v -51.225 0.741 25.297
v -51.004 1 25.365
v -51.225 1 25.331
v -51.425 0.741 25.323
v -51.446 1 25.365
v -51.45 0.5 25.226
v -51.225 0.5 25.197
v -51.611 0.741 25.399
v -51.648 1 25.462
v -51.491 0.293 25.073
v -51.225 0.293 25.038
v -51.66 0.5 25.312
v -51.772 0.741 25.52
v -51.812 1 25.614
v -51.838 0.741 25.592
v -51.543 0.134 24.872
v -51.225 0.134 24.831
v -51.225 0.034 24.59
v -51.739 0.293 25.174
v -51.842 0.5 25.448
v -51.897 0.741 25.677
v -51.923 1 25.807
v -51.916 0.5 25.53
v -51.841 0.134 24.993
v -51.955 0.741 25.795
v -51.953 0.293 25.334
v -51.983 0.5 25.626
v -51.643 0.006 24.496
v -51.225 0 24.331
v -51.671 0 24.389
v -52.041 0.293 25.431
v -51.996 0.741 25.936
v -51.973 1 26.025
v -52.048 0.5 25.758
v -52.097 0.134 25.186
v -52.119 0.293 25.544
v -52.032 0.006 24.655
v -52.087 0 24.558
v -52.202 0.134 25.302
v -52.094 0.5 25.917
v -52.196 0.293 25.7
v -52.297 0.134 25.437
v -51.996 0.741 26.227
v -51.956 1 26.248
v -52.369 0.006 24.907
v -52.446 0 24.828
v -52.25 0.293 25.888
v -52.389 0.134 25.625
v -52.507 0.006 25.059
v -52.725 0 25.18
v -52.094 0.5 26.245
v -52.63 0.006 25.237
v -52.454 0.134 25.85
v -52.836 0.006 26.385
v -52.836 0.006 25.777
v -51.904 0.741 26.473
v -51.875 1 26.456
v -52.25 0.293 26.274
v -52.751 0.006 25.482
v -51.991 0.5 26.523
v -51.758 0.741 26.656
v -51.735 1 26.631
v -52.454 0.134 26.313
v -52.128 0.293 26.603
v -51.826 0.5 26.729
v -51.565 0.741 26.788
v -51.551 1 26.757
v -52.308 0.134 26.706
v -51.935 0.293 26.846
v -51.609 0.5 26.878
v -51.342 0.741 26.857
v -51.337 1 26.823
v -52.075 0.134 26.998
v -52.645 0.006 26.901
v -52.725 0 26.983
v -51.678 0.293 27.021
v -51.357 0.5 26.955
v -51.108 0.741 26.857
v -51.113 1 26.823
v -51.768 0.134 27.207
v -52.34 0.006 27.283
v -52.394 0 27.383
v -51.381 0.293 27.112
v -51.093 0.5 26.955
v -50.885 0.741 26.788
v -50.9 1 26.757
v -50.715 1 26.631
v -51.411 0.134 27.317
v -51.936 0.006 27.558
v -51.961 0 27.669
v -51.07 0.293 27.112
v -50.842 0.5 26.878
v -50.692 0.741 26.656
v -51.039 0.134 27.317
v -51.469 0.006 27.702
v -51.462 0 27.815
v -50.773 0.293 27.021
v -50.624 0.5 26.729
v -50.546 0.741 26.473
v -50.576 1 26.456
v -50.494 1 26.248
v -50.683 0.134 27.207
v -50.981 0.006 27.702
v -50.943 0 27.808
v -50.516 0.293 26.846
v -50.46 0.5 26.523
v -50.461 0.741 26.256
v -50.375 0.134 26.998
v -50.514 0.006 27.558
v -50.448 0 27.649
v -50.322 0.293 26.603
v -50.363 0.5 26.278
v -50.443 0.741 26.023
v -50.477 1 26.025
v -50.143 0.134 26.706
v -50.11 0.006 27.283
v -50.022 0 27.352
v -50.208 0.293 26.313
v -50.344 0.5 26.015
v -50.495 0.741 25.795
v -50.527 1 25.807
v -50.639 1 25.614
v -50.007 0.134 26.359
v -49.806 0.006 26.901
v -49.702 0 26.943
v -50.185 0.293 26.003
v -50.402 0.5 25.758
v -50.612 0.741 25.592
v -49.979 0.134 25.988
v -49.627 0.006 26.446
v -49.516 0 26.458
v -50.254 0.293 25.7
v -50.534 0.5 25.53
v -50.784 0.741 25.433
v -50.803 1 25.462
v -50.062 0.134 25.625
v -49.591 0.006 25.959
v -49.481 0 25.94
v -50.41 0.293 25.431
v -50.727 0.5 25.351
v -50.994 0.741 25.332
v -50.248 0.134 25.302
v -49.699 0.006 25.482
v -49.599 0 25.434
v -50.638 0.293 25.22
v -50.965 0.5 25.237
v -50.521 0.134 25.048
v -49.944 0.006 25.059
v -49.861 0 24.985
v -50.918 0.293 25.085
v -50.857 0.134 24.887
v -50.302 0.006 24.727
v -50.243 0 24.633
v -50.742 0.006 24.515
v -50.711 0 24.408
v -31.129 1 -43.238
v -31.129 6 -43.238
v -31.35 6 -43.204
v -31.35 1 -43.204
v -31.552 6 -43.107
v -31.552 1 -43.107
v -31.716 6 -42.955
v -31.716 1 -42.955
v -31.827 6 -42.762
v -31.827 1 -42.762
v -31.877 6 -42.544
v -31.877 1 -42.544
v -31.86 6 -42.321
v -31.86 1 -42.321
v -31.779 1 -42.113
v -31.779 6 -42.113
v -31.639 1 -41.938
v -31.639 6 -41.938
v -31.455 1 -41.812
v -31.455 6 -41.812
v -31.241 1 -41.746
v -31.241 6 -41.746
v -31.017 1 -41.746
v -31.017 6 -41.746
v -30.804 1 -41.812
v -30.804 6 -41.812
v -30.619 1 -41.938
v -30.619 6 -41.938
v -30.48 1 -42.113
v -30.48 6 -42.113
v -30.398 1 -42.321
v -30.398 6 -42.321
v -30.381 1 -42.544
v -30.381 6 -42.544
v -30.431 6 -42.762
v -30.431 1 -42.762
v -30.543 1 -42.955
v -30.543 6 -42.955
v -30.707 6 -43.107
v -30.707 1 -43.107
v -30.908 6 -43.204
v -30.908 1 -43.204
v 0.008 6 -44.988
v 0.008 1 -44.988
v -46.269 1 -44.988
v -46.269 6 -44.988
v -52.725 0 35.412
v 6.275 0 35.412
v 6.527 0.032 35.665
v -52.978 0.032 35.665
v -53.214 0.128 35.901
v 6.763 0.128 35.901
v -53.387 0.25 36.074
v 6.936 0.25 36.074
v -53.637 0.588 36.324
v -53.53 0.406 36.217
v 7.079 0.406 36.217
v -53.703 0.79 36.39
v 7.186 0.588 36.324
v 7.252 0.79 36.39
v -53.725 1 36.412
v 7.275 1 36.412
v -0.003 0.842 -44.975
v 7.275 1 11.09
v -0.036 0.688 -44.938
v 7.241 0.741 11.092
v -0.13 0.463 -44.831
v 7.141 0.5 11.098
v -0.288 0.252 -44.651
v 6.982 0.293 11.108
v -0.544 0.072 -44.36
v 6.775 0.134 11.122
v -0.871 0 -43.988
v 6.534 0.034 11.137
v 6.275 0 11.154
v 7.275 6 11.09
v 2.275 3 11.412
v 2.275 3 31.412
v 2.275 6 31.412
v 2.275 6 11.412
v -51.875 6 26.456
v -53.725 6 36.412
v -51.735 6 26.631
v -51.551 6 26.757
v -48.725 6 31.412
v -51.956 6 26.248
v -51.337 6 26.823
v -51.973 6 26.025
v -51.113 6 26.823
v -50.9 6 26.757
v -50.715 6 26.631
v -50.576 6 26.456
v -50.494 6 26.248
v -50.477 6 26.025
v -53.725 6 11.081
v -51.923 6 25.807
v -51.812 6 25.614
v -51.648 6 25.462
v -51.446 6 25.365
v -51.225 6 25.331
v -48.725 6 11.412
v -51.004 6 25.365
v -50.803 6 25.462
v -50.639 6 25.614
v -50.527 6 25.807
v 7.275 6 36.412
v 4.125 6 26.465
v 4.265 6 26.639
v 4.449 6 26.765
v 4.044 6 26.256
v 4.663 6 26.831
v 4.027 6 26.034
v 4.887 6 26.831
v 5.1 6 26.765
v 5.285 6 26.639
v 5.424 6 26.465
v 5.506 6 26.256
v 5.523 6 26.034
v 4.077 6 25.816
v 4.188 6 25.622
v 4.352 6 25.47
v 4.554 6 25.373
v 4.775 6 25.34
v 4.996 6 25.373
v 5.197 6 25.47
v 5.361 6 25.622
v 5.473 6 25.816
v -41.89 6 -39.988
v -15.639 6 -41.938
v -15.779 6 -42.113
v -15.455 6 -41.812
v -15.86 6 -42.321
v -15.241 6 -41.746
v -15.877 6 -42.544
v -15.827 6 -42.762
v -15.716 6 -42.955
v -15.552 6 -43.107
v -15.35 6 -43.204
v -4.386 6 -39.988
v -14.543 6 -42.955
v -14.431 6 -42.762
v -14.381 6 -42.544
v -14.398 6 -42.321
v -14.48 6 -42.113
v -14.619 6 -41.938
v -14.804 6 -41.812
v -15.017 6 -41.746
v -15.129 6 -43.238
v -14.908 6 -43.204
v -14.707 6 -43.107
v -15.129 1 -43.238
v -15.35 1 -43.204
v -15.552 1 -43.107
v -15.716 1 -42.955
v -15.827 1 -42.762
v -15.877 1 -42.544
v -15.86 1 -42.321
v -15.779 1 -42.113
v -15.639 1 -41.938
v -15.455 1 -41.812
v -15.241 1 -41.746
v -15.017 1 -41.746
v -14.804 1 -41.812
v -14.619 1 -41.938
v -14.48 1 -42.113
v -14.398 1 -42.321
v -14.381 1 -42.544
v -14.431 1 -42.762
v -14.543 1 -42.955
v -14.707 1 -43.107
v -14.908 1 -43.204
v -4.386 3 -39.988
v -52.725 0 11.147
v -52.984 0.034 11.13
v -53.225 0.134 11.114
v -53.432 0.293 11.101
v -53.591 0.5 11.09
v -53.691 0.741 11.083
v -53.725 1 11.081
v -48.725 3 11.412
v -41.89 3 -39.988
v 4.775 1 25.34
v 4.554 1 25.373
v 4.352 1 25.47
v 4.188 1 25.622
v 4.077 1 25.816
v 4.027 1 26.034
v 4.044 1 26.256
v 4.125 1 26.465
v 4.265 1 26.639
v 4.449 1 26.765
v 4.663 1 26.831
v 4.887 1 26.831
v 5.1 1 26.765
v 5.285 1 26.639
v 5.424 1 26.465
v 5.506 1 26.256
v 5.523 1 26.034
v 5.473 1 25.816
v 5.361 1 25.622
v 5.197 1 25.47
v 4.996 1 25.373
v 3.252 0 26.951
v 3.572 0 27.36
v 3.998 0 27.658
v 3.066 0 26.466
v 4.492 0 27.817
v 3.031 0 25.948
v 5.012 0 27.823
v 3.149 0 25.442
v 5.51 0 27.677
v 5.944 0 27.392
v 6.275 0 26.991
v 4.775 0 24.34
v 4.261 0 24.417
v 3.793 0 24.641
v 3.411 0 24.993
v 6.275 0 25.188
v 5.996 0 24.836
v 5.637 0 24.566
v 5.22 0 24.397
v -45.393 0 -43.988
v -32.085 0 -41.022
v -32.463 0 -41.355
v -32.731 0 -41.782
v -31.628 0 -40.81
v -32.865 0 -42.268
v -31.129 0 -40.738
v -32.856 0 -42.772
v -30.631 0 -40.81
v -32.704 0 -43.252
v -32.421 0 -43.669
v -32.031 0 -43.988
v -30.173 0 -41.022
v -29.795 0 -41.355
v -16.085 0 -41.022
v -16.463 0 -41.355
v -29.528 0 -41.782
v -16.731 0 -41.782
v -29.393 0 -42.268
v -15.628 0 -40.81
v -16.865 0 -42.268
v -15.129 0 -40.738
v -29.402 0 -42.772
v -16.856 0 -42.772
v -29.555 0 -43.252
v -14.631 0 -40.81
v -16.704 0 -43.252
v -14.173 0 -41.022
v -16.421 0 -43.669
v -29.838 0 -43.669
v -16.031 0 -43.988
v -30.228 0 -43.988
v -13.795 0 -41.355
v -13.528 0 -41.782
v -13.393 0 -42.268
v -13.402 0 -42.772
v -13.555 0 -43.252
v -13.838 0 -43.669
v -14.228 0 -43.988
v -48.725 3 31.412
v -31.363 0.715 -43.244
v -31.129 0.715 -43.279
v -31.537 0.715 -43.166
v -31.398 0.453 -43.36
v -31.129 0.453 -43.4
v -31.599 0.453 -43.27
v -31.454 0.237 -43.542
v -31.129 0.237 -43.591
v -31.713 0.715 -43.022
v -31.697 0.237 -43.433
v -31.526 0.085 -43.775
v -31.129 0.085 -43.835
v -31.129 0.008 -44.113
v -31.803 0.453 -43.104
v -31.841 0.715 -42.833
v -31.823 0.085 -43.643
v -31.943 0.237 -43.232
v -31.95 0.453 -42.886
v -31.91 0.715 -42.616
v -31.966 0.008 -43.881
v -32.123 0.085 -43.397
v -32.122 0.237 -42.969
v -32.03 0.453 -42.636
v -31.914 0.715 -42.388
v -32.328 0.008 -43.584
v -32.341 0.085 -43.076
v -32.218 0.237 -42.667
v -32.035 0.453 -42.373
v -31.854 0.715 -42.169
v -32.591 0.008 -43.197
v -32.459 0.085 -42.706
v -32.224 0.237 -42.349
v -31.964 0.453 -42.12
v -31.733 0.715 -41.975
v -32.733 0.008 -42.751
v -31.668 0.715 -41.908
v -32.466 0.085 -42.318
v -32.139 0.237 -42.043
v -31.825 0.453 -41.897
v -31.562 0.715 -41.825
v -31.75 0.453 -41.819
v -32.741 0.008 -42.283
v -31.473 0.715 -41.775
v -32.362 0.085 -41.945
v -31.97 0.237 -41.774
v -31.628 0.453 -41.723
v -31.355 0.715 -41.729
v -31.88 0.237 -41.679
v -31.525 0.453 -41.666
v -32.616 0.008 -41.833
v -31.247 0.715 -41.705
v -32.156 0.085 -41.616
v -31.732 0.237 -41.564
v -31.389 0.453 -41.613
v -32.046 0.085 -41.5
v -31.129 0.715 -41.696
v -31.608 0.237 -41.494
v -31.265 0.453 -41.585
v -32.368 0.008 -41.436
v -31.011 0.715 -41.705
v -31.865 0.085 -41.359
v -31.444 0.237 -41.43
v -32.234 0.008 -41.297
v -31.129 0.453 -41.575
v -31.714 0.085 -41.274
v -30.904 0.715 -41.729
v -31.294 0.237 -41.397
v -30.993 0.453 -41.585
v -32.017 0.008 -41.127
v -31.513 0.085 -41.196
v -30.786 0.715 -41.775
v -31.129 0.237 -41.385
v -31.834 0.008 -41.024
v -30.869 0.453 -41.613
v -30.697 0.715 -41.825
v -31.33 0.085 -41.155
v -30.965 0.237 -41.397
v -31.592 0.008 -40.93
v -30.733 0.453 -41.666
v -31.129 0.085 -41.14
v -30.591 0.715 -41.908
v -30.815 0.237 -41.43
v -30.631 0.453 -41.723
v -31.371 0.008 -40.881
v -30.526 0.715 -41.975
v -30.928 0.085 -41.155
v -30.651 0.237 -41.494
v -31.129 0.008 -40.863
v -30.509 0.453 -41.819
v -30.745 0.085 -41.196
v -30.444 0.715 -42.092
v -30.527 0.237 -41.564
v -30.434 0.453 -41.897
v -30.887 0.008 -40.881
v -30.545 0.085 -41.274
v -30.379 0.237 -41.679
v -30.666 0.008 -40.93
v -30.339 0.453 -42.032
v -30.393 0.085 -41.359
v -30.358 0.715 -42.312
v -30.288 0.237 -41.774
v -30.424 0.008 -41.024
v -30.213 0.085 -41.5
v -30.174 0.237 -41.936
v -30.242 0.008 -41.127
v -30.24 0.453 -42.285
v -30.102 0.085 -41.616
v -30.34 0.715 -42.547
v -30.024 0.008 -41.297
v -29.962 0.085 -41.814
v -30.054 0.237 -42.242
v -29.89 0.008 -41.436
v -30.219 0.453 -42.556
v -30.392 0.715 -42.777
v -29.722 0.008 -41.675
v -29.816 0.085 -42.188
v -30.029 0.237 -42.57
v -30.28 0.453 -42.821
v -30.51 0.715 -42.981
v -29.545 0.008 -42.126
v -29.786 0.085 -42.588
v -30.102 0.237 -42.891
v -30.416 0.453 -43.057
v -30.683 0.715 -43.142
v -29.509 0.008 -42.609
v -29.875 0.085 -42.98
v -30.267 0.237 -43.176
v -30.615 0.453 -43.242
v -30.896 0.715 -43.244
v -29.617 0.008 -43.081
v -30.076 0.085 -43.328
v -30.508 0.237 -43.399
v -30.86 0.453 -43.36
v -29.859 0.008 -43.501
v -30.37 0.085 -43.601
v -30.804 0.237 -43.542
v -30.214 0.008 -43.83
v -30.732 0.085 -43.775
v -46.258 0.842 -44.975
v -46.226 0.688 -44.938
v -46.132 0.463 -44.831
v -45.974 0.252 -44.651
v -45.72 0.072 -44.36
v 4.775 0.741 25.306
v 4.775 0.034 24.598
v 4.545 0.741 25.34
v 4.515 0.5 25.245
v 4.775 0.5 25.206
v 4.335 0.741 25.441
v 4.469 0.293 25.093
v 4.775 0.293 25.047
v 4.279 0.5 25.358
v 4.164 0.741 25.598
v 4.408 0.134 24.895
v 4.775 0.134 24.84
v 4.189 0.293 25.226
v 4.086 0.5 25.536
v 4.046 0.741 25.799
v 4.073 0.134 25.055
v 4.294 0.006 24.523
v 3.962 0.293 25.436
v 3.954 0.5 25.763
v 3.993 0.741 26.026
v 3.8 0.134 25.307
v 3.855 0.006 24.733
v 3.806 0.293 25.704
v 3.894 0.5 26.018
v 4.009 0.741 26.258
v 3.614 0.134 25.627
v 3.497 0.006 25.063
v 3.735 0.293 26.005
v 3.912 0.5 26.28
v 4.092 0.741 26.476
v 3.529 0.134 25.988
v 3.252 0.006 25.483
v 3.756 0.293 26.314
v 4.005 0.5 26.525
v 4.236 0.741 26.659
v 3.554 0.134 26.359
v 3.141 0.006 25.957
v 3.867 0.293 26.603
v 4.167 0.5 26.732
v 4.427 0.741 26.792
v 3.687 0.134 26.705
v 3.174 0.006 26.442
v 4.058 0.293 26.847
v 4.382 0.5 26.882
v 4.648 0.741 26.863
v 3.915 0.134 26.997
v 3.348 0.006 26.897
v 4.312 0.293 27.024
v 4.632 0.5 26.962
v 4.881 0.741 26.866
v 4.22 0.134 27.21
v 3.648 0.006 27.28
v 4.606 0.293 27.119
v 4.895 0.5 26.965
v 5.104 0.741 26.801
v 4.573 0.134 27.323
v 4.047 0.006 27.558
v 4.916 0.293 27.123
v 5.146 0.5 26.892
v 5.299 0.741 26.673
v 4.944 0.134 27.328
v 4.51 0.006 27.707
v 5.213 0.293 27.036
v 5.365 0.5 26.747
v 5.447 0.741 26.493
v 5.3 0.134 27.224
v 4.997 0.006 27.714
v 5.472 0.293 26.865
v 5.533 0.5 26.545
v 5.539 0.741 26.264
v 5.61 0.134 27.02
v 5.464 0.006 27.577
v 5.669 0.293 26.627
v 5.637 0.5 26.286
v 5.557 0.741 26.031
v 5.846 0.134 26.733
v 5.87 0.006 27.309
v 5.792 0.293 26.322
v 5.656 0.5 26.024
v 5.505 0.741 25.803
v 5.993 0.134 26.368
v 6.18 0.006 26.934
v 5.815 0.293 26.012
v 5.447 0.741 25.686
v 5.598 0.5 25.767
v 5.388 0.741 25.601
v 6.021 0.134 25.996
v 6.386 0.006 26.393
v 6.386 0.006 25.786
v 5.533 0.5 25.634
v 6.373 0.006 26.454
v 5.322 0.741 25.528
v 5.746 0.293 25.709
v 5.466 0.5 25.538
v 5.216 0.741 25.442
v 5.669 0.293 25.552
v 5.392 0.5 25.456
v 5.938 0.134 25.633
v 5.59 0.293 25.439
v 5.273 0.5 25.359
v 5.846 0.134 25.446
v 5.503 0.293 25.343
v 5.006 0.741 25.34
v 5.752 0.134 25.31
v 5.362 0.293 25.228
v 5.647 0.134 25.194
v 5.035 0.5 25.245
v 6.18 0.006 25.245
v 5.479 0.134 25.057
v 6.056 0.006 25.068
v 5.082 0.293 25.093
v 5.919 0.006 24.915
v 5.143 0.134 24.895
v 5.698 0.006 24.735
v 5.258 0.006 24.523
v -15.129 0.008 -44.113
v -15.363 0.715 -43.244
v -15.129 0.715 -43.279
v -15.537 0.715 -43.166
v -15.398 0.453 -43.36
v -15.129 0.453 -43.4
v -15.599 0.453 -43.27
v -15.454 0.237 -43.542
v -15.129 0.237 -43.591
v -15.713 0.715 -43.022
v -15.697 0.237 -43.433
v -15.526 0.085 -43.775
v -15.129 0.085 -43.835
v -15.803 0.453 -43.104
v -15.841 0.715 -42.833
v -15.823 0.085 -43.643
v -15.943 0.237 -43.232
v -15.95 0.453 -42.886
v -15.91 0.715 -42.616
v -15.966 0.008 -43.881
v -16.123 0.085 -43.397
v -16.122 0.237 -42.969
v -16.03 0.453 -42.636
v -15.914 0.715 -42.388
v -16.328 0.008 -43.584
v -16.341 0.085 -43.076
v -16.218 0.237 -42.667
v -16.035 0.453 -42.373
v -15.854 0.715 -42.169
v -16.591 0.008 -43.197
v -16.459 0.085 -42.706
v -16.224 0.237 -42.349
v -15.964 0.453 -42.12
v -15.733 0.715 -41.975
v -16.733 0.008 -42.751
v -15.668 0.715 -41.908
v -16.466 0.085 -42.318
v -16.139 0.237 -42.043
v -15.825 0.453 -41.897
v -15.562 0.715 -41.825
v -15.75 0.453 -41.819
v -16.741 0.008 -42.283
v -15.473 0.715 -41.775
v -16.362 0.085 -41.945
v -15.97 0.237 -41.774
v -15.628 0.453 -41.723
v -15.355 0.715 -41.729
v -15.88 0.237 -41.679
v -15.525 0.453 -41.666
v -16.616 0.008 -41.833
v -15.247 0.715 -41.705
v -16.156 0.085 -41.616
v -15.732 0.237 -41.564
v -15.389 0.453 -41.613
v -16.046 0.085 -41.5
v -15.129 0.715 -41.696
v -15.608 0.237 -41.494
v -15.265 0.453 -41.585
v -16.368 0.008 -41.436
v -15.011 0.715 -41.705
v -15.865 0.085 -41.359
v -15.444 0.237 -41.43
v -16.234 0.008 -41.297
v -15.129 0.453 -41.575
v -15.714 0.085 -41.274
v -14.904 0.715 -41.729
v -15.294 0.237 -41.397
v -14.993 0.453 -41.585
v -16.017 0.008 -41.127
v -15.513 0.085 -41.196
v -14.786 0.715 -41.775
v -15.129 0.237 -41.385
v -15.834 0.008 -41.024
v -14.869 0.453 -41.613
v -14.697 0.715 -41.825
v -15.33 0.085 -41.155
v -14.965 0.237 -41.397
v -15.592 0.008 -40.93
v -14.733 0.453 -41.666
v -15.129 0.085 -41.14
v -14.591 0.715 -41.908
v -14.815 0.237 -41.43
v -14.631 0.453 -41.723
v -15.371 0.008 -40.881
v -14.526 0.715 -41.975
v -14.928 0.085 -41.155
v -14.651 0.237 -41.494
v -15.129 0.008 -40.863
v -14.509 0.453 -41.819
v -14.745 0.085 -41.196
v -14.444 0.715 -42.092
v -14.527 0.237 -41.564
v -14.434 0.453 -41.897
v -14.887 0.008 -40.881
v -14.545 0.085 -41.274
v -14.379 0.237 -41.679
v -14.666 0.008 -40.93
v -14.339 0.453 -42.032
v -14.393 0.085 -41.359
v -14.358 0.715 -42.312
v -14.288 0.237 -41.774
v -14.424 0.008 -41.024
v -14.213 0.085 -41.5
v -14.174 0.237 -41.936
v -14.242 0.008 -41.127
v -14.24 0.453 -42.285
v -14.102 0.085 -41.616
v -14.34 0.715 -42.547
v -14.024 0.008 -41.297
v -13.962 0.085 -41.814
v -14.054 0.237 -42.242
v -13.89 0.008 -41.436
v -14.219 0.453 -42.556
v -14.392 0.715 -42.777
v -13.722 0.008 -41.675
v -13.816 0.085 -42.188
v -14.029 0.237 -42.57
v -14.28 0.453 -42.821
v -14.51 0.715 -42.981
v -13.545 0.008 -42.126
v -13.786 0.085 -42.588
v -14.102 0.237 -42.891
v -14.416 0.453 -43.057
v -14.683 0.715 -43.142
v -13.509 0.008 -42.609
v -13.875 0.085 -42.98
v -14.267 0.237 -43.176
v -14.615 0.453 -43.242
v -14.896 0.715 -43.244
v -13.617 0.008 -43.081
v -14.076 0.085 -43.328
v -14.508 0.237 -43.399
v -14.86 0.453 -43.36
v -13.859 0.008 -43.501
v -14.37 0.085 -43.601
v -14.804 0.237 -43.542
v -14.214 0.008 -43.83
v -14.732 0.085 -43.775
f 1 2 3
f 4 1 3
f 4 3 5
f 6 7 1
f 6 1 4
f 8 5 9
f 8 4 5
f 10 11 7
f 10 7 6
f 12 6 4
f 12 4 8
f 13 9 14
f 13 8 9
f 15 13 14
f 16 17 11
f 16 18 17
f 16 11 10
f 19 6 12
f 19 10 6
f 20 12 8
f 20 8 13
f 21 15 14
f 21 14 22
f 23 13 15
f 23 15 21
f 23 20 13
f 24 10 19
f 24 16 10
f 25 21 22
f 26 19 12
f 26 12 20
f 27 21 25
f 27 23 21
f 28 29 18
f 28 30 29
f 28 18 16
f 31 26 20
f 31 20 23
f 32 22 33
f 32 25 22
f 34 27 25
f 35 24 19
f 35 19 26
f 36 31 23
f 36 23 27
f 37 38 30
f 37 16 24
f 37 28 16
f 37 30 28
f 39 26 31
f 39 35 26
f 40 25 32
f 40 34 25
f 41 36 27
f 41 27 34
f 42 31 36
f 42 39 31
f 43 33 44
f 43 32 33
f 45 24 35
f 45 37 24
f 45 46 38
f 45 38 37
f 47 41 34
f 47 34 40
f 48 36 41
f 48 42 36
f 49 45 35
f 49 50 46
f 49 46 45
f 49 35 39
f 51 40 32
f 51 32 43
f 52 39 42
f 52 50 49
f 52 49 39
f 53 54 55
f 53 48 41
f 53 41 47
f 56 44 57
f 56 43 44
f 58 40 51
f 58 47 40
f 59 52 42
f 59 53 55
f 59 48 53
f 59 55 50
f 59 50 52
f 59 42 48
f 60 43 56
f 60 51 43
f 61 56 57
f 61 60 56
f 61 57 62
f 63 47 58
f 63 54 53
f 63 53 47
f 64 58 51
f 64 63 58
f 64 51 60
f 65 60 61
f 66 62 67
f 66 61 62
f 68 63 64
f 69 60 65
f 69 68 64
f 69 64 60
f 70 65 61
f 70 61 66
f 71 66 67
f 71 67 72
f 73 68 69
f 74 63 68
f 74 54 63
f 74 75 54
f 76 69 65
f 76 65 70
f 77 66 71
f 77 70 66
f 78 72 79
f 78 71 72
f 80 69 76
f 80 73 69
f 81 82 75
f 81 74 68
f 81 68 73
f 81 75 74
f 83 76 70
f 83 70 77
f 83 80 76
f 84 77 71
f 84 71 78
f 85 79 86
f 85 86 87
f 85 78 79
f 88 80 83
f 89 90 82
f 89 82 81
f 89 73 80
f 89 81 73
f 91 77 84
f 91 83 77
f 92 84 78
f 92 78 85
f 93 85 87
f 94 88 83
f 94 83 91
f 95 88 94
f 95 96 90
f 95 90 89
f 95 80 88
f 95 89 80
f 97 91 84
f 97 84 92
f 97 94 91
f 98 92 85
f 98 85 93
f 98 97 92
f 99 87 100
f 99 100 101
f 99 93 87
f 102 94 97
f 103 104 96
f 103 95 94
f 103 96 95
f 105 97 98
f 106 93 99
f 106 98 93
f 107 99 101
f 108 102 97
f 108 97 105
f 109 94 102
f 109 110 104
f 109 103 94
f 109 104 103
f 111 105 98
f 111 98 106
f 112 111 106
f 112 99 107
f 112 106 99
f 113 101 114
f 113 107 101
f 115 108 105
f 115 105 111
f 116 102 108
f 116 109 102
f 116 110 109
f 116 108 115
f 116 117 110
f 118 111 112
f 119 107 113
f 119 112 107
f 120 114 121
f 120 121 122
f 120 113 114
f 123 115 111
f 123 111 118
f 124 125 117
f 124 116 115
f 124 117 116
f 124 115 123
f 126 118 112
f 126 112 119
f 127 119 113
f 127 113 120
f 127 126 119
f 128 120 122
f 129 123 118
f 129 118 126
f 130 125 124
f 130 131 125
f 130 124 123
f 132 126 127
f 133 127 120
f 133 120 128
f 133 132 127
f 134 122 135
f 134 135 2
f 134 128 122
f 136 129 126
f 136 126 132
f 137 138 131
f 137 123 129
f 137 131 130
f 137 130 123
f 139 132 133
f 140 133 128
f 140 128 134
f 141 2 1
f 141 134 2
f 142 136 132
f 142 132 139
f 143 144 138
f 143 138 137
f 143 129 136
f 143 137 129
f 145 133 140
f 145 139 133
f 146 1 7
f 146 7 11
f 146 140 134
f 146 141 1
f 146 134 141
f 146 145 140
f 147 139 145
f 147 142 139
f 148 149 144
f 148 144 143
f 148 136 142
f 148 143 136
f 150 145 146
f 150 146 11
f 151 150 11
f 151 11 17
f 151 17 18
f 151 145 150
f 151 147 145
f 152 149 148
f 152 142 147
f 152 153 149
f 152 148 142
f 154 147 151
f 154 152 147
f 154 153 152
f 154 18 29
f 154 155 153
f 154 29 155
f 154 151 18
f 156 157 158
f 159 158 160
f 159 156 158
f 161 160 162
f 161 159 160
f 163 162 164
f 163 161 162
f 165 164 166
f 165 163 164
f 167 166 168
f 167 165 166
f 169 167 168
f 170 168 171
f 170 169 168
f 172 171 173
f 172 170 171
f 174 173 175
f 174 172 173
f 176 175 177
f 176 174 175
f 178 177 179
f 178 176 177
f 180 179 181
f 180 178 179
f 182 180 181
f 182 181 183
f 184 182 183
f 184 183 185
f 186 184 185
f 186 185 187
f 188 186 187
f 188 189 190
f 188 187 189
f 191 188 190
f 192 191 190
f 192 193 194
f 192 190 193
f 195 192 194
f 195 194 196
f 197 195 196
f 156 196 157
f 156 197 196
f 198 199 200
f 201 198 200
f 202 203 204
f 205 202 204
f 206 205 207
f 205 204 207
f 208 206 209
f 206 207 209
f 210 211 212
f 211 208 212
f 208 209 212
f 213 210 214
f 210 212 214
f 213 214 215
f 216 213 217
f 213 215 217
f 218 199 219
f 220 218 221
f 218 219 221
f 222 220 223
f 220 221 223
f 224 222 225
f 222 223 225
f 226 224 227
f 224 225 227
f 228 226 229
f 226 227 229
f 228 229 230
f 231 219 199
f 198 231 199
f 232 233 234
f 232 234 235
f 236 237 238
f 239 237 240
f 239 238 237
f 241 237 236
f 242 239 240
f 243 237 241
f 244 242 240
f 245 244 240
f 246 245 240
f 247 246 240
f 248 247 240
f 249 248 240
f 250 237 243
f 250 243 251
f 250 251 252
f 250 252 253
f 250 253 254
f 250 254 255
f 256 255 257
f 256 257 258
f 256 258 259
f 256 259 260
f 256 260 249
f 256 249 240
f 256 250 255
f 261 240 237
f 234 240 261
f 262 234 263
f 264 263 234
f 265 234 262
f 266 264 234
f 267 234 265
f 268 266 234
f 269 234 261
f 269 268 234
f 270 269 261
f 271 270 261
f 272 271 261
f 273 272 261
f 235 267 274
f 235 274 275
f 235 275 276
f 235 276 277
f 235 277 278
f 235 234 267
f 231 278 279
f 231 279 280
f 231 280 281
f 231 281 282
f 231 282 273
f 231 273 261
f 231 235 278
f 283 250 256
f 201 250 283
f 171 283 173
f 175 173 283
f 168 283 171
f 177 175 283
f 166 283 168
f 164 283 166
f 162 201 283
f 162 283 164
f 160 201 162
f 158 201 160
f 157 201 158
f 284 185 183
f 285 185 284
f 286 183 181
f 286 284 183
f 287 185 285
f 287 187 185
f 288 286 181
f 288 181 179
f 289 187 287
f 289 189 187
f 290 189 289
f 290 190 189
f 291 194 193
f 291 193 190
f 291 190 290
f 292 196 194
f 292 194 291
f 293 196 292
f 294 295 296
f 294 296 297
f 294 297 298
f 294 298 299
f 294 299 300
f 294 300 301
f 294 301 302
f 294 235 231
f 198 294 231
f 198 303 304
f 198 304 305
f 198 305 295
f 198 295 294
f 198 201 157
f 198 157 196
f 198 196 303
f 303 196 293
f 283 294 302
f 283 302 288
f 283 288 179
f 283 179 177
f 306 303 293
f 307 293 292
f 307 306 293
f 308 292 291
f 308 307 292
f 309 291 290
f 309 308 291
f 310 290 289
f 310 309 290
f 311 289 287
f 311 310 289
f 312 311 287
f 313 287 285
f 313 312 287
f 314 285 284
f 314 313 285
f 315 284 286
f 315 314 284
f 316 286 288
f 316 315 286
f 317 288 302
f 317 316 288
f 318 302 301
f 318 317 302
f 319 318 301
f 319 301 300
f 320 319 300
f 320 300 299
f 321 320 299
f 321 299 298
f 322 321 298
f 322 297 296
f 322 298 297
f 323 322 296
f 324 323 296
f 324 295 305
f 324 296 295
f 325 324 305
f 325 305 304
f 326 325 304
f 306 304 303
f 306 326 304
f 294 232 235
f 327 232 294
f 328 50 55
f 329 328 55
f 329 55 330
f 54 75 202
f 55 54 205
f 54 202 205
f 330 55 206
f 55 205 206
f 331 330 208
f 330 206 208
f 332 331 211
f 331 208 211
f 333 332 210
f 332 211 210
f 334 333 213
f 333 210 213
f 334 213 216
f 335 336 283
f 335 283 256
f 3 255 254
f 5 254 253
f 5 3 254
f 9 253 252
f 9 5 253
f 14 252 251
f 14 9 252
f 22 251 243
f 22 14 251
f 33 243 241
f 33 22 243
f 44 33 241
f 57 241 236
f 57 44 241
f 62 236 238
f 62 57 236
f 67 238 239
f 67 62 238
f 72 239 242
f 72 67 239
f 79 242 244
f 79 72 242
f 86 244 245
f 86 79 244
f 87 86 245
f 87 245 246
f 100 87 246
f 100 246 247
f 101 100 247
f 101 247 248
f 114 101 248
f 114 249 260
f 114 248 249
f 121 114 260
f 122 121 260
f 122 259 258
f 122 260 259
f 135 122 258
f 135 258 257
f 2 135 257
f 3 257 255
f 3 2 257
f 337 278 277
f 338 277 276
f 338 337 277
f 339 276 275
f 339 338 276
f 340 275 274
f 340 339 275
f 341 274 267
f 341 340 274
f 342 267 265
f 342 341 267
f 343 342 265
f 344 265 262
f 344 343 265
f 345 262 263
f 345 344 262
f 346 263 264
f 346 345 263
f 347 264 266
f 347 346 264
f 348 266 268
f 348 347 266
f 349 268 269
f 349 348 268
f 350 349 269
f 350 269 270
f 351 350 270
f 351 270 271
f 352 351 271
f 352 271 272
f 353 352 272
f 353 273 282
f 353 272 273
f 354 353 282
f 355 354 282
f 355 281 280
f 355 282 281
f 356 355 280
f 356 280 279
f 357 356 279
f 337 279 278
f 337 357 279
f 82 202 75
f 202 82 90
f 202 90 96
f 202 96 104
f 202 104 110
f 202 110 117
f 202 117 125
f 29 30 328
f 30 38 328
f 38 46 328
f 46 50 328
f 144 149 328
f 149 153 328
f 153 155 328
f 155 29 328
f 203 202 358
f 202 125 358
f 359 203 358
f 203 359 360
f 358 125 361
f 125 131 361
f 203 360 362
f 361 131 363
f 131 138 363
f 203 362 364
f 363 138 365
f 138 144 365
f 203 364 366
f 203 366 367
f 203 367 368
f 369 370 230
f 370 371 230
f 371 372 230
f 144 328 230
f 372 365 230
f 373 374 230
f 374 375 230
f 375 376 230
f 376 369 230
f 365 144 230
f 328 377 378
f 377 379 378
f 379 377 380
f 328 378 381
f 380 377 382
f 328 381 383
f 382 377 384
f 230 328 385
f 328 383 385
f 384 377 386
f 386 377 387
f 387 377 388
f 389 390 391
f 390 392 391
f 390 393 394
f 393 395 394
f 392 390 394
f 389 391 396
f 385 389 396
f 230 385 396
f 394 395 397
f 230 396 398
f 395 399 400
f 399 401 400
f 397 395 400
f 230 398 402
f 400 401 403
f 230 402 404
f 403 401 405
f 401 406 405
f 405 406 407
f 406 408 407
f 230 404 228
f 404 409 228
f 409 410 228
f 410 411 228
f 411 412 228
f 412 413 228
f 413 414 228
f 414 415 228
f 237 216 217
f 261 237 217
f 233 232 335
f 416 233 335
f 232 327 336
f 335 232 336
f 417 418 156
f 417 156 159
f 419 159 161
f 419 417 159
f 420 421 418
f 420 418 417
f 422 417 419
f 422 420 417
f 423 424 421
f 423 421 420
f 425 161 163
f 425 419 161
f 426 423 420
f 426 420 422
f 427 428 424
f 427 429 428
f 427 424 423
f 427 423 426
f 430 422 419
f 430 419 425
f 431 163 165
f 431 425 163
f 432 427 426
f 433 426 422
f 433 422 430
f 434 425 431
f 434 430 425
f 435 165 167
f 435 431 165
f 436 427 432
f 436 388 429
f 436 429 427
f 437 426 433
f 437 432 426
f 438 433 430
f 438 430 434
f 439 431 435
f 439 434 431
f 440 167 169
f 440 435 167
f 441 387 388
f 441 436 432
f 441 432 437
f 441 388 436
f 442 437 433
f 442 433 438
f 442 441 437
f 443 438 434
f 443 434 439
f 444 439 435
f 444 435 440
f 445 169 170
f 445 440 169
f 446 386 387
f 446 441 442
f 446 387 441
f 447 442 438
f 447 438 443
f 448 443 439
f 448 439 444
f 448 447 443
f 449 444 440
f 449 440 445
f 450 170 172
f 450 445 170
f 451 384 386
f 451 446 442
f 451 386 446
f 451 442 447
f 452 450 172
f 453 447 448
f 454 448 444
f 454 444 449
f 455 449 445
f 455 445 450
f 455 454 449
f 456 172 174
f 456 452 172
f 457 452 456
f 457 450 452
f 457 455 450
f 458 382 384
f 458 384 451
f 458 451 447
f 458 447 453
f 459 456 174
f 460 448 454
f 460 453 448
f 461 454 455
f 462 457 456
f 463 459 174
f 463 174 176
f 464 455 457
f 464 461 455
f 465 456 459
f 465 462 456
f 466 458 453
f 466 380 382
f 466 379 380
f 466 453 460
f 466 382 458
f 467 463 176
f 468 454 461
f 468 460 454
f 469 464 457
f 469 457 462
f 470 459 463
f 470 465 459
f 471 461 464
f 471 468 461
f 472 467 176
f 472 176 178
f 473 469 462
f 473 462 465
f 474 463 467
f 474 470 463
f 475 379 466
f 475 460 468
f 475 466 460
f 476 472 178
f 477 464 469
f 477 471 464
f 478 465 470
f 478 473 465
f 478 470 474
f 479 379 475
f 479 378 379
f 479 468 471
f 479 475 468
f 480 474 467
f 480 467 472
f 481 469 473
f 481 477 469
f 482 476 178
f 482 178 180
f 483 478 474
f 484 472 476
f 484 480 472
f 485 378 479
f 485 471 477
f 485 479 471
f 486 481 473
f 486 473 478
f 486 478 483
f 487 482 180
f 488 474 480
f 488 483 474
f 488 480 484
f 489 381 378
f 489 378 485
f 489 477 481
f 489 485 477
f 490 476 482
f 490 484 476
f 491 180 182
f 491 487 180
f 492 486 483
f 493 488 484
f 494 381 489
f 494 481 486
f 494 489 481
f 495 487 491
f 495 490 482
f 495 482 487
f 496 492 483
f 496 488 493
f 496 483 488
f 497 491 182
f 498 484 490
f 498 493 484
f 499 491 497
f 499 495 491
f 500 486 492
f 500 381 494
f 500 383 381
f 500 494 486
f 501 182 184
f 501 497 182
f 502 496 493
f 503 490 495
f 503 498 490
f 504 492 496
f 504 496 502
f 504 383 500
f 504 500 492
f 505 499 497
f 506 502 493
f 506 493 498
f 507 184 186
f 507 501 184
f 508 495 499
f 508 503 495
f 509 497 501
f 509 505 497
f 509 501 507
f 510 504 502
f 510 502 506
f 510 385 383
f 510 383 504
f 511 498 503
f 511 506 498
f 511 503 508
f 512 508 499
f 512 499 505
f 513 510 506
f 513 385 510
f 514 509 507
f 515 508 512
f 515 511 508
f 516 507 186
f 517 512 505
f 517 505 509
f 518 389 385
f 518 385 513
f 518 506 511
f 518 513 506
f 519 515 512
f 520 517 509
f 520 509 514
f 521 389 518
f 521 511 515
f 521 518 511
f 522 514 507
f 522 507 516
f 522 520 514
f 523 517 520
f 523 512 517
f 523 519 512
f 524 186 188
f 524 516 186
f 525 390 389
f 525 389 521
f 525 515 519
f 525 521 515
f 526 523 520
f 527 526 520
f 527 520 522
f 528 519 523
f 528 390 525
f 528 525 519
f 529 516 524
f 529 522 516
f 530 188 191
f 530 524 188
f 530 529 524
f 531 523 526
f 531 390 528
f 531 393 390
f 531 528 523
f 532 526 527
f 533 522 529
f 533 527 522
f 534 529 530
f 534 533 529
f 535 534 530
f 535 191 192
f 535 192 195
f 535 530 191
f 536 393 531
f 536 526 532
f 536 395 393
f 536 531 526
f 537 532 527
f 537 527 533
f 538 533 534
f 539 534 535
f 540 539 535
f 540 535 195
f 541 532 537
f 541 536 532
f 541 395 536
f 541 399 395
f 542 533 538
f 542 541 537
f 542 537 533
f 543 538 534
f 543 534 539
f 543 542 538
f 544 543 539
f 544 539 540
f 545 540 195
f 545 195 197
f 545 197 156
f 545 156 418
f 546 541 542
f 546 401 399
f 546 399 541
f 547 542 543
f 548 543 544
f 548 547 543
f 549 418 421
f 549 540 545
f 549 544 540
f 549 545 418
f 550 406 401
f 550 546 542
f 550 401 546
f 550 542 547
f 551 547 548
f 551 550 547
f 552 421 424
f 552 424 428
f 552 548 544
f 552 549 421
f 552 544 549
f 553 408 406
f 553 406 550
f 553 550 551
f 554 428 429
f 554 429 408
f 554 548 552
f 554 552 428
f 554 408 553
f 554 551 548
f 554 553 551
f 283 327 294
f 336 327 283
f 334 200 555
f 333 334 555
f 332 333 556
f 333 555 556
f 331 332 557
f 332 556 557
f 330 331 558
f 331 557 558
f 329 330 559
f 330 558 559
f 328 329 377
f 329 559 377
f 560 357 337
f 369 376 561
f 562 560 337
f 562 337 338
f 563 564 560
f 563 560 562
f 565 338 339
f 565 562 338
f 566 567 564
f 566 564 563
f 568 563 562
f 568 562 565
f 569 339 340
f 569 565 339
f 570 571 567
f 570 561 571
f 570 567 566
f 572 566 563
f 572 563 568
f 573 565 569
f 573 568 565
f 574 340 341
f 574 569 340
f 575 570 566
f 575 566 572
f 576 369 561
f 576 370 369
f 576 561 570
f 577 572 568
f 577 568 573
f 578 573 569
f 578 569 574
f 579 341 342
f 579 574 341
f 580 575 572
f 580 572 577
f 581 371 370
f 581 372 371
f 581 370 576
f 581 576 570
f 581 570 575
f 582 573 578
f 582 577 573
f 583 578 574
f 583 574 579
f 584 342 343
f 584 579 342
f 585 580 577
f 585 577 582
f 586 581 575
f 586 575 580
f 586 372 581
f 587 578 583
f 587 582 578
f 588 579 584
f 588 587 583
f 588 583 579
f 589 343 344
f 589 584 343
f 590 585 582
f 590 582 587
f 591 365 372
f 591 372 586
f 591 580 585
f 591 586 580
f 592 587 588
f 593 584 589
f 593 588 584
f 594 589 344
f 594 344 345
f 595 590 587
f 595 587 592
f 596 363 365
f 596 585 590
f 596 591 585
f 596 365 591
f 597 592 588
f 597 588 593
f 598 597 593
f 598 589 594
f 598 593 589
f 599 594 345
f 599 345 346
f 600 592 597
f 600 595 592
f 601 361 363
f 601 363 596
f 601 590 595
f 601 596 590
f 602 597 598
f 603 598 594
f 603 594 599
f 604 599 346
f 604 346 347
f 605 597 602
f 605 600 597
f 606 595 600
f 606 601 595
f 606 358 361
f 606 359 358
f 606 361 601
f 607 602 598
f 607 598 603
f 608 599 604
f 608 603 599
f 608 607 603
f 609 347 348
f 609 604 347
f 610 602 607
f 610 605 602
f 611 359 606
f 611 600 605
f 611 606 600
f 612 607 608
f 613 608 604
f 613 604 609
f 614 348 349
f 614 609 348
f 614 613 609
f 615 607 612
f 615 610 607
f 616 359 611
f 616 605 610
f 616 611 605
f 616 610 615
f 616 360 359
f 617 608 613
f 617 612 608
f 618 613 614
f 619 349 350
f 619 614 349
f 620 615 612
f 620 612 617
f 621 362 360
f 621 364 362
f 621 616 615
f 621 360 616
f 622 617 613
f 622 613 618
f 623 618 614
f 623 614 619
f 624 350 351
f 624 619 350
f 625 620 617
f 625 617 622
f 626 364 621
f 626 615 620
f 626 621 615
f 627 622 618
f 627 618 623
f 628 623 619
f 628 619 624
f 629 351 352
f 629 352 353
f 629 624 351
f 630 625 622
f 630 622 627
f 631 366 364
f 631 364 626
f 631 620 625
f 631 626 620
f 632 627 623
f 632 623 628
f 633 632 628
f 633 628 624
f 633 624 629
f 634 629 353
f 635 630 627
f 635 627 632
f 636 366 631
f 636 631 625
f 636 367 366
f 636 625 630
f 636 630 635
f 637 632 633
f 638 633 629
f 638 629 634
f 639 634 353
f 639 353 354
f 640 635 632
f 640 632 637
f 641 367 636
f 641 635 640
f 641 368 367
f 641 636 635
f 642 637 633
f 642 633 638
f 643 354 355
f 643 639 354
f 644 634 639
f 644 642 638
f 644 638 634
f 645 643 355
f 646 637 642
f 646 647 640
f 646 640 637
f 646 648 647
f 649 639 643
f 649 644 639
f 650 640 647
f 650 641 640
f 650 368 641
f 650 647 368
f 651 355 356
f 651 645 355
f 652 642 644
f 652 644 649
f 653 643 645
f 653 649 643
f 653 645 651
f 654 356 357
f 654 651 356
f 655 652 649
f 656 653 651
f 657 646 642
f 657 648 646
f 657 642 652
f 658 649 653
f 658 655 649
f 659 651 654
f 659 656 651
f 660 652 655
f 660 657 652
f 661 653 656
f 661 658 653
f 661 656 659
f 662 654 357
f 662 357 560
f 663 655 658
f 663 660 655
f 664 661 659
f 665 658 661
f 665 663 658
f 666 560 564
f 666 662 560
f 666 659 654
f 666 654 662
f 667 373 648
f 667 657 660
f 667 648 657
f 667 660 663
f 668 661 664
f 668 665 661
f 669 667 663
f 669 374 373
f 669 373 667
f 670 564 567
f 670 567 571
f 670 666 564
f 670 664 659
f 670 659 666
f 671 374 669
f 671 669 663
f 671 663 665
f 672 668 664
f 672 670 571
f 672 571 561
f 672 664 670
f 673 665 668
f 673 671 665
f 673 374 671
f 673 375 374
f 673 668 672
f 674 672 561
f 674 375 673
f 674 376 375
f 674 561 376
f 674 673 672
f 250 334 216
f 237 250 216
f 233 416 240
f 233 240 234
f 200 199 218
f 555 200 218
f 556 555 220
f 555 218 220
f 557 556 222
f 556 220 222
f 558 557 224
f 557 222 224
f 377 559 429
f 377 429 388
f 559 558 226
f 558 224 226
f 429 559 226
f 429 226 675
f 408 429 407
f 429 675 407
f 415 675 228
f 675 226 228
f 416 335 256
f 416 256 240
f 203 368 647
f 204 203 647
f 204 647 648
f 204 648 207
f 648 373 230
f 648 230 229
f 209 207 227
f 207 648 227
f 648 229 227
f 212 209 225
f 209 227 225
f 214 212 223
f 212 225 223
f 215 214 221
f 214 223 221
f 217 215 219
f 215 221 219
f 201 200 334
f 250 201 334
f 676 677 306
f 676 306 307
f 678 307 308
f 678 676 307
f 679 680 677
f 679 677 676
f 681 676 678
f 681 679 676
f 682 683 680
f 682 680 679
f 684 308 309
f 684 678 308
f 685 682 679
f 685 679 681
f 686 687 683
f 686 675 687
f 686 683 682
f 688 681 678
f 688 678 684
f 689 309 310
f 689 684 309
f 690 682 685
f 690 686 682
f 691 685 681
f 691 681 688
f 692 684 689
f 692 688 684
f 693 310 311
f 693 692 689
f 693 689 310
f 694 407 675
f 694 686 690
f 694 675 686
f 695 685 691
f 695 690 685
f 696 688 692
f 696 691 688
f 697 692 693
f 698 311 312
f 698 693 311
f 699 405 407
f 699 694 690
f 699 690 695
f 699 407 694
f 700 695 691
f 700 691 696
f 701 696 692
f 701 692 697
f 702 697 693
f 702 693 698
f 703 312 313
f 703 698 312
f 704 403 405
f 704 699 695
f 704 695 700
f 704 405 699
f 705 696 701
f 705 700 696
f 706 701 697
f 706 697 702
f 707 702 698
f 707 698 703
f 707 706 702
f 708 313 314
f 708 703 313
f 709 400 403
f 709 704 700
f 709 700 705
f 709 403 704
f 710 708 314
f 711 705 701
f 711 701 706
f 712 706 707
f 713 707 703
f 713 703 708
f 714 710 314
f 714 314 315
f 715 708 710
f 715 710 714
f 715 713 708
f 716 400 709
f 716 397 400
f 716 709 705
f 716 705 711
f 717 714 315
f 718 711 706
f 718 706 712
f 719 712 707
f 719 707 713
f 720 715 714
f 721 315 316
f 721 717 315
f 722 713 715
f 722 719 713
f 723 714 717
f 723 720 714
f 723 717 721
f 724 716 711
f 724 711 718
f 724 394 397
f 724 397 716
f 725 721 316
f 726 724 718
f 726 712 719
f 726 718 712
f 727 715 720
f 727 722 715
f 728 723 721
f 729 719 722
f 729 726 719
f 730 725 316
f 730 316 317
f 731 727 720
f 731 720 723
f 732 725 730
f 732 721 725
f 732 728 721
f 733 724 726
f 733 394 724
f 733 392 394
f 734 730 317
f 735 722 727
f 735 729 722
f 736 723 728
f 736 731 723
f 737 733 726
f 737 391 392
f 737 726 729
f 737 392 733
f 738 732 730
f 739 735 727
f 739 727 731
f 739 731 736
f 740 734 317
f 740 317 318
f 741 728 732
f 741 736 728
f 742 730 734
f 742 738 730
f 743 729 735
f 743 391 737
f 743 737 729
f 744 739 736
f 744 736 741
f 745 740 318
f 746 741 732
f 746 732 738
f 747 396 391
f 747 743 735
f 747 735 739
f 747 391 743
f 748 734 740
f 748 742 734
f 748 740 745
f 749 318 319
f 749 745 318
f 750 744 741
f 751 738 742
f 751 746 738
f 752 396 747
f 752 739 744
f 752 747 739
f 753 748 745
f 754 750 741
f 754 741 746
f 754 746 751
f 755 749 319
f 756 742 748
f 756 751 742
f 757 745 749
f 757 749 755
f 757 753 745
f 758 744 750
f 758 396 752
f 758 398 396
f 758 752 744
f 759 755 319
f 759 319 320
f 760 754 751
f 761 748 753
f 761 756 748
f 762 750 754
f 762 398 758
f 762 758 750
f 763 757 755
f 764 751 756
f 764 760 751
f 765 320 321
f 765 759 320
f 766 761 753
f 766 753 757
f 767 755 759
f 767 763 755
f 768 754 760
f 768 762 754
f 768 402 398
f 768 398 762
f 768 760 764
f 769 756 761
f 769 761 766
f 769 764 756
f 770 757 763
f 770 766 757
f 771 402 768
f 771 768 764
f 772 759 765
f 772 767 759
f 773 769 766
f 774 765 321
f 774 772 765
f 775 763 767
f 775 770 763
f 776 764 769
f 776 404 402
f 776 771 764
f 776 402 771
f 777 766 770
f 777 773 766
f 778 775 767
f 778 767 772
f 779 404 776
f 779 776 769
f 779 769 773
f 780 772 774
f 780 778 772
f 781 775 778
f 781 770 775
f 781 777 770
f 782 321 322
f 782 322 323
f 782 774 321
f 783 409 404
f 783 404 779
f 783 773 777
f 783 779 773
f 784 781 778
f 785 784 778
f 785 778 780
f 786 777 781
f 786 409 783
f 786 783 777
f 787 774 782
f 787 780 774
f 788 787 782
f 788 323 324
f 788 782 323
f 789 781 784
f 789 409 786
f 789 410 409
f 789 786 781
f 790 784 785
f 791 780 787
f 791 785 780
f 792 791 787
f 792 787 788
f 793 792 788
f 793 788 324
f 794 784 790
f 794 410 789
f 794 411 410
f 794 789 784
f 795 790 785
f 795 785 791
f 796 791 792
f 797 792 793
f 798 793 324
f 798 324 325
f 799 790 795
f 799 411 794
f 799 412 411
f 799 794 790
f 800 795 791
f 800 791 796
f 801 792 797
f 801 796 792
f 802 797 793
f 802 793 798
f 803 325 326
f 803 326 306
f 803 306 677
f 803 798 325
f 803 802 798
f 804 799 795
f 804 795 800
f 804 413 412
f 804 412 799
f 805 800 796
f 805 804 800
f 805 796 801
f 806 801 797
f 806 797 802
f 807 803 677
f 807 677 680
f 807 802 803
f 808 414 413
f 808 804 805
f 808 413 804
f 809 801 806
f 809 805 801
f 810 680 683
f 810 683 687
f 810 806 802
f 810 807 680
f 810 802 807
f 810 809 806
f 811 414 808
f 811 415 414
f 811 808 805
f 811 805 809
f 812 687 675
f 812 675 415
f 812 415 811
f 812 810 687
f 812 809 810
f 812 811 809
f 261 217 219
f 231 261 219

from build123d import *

# Parameters (mm, degrees)
DODANIE_WYCI_GNI_CIE1_DEPTH       = 3
WYCI_GNI_CIE_CIENKA_CIANKA1_DEPTH = 6
WYTNIJ_WYCI_GNI_CIE1_DEPTH        = 51
WYTNIJ_WYCI_GNI_CIE1_DEPTH_BACK   = 39
SZKIC5_R                          = 0.75
ZAOKR_GLENIE1_R                   = 1


with BuildPart() as part:
    # Szkic1 → Dodanie-wyciągnięcie1 (new body)
    with BuildSketch(Plane(origin=(0, 0, 0), x_dir=(1, 0, 0), z_dir=(0, 1, 0))):
        Polygon((-46.22519084, 44.98778626), (-0.22519084, 44.98778626), (7.27480916, -12.885496183), (7.27480916, -36.41221374), (-53.72519084, -36.41221374), (-53.72519084, -11.41221374), align=None)
    extrude(amount=DODANIE_WYCI_GNI_CIE1_DEPTH)

    # Szkic3 → Wyciągnięcie-cienka ścianka1 (add)
    with BuildSketch(Plane(origin=(0, 0, 0), x_dir=(1, 0, 0), z_dir=(0, 1, 0))):
        Polygon((7.27480916, -11.089579023), (0.007548313, 44.98778626), (-46.269205463, 44.98778626), (-53.72519084, -11.081223772), (-53.72519084, -36.41221374), (7.27480916, -36.41221374), align=None)
        Polygon((2.27480916, -11.41221374), (-4.386295649, 39.98778626), (-41.890084457, 39.98778626), (-48.72519084, -11.41221374), (-48.72519084, -31.41221374), (2.27480916, -31.41221374), align=None, mode=Mode.SUBTRACT)
    extrude(amount=WYCI_GNI_CIE_CIENKA_CIANKA1_DEPTH)

    # Szkic5 → Wytnij-wyciągnięcie1 (cut, two sides: drawn at the far end of the back side and taken through both)
    with BuildSketch(Plane(origin=(0, 6, 0), x_dir=(1, 0, 0), z_dir=(0, 1, 0)).offset(-WYTNIJ_WYCI_GNI_CIE1_DEPTH_BACK)):
        with Locations(Location((-31.129205463, 42.48778626, 0), (0, 0, 90))):
            Circle(SZKIC5_R)
        with Locations(Location((-15.129205463, 42.48778626, 0), (0, 0, 90))):
            Circle(SZKIC5_R)
        with Locations(Location((-51.22519084, -26.081223772, 0), (0, 0, 90))):
            Circle(SZKIC5_R)
        with Locations(Location((4.77480916, -26.089579023, 0), (0, 0, 90))):
            Circle(SZKIC5_R)
    extrude(amount=WYTNIJ_WYCI_GNI_CIE1_DEPTH + WYTNIJ_WYCI_GNI_CIE1_DEPTH_BACK, mode=Mode.SUBTRACT)

    # Zaokrąglenie1
    # the kernel refuses this fillet: 1 mm, written as the material it takes off along each edge
    with BuildSketch(Plane(origin=(-45.939659622, 0, -47.465970986), x_dir=(0, 1, 0), z_dir=(-0.13181833651416436, 0, 0.9912738905865718))) as zaokr_glenie1_piece_1:
        with BuildLine():
            CenterArc((ZAOKR_GLENIE1_R, -ZAOKR_GLENIE1_R), ZAOKR_GLENIE1_R, 90, 90)
            Line((0, -ZAOKR_GLENIE1_R), (0, 0))
            Line((0, 0), (ZAOKR_GLENIE1_R, 0))
        make_face()
    extrude(amount=61.562581305, mode=Mode.SUBTRACT)
    with BuildSketch(Plane(origin=(7.596106085, 0, 13.568846714), x_dir=(0, 1, 0), z_dir=(-0.12851876998328252, 0, -0.9917070765916638))) as zaokr_glenie1_piece_2:
        with BuildLine():
            CenterArc((ZAOKR_GLENIE1_R, -ZAOKR_GLENIE1_R), ZAOKR_GLENIE1_R, 90, 90)
            Line((0, -ZAOKR_GLENIE1_R), (0, 0))
            Line((0, 0), (ZAOKR_GLENIE1_R, 0))
        make_face()
    extrude(amount=61.546299413, mode=Mode.SUBTRACT)
    with BuildSketch(Plane(origin=(2.507548313, 0, -44.98778626), x_dir=(0, 1, 0), z_dir=(-1, 0, 0))) as zaokr_glenie1_piece_3:
        with BuildLine():
            CenterArc((ZAOKR_GLENIE1_R, -ZAOKR_GLENIE1_R), ZAOKR_GLENIE1_R, 90, 90)
            Line((0, -ZAOKR_GLENIE1_R), (0, 0))
            Line((0, 0), (ZAOKR_GLENIE1_R, 0))
        make_face()
    extrude(amount=51.276753776, mode=Mode.SUBTRACT)
    with BuildSketch(Plane(origin=(-51.22519084, 0, 26.081223772), x_dir=(0, 0, -1), z_dir=(1, 0, 0))) as zaokr_glenie1_piece_4:
        with BuildLine():
            CenterArc((0.75 + ZAOKR_GLENIE1_R, ZAOKR_GLENIE1_R), ZAOKR_GLENIE1_R, 180, 90)
            Line((0.75, ZAOKR_GLENIE1_R), (0.75, 0))
            Line((0.75, 0), (0.75 + ZAOKR_GLENIE1_R, 0))
        make_face()
    revolve(axis=Axis((-51.22519084, 0, 26.081223772), (0, 1, 0)), mode=Mode.SUBTRACT)
    with BuildSketch(Plane(origin=(4.77480916, 0, 26.089579023), x_dir=(0, 0, -1), z_dir=(1, 0, 0))) as zaokr_glenie1_piece_5:
        with BuildLine():
            CenterArc((0.75 + ZAOKR_GLENIE1_R, ZAOKR_GLENIE1_R), ZAOKR_GLENIE1_R, 180, 90)
            Line((0.75, ZAOKR_GLENIE1_R), (0.75, 0))
            Line((0.75, 0), (0.75 + ZAOKR_GLENIE1_R, 0))
        make_face()
    revolve(axis=Axis((4.77480916, 0, 26.089579023), (0, 1, 0)), mode=Mode.SUBTRACT)
    with BuildSketch(Plane(origin=(7.27480916, 0, 8.589579023), x_dir=(-1, 0, 0), z_dir=(0, 0, 1))) as zaokr_glenie1_piece_6:
        with BuildLine():
            CenterArc((ZAOKR_GLENIE1_R, -ZAOKR_GLENIE1_R), ZAOKR_GLENIE1_R, 90, 90)
            Line((0, -ZAOKR_GLENIE1_R), (0, 0))
            Line((0, 0), (ZAOKR_GLENIE1_R, 0))
        make_face()
    extrude(amount=30.322634717, mode=Mode.SUBTRACT)
    with BuildSketch(Plane(origin=(-15.129205463, 0, -42.48778626), x_dir=(0, 0, -1), z_dir=(1, 0, 0))) as zaokr_glenie1_piece_7:
        with BuildLine():
            CenterArc((0.75 + ZAOKR_GLENIE1_R, ZAOKR_GLENIE1_R), ZAOKR_GLENIE1_R, 180, 90)
            Line((0.75, ZAOKR_GLENIE1_R), (0.75, 0))
            Line((0.75, 0), (0.75 + ZAOKR_GLENIE1_R, 0))
        make_face()
    revolve(axis=Axis((-15.129205463, 0, -42.48778626), (0, 1, 0)), mode=Mode.SUBTRACT)
    with BuildSketch(Plane(origin=(9.77480916, 0, 36.41221374), x_dir=(0, 0, -1), z_dir=(-1, 0, 0))) as zaokr_glenie1_piece_8:
        with BuildLine():
            CenterArc((ZAOKR_GLENIE1_R, -ZAOKR_GLENIE1_R), ZAOKR_GLENIE1_R, 90, 90)
            Line((0, -ZAOKR_GLENIE1_R), (0, 0))
            Line((0, 0), (ZAOKR_GLENIE1_R, 0))
        make_face()
    extrude(amount=66, mode=Mode.SUBTRACT)
    with BuildSketch(Plane(origin=(-31.129205463, 0, -42.48778626), x_dir=(0, 0, -1), z_dir=(1, 0, 0))) as zaokr_glenie1_piece_9:
        with BuildLine():
            CenterArc((0.75 + ZAOKR_GLENIE1_R, ZAOKR_GLENIE1_R), ZAOKR_GLENIE1_R, 180, 90)
            Line((0.75, ZAOKR_GLENIE1_R), (0.75, 0))
            Line((0.75, 0), (0.75 + ZAOKR_GLENIE1_R, 0))
        make_face()
    revolve(axis=Axis((-31.129205463, 0, -42.48778626), (0, 1, 0)), mode=Mode.SUBTRACT)
    with BuildSketch(Plane(origin=(-53.72519084, 0, 38.91221374), x_dir=(1, 0, 0), z_dir=(0, 0, -1))) as zaokr_glenie1_piece_10:
        with BuildLine():
            CenterArc((ZAOKR_GLENIE1_R, -ZAOKR_GLENIE1_R), ZAOKR_GLENIE1_R, 90, 90)
            Line((0, -ZAOKR_GLENIE1_R), (0, 0))
            Line((0, 0), (ZAOKR_GLENIE1_R, 0))
        make_face()
    extrude(amount=30.330989969, mode=Mode.SUBTRACT)


solid = part.part
